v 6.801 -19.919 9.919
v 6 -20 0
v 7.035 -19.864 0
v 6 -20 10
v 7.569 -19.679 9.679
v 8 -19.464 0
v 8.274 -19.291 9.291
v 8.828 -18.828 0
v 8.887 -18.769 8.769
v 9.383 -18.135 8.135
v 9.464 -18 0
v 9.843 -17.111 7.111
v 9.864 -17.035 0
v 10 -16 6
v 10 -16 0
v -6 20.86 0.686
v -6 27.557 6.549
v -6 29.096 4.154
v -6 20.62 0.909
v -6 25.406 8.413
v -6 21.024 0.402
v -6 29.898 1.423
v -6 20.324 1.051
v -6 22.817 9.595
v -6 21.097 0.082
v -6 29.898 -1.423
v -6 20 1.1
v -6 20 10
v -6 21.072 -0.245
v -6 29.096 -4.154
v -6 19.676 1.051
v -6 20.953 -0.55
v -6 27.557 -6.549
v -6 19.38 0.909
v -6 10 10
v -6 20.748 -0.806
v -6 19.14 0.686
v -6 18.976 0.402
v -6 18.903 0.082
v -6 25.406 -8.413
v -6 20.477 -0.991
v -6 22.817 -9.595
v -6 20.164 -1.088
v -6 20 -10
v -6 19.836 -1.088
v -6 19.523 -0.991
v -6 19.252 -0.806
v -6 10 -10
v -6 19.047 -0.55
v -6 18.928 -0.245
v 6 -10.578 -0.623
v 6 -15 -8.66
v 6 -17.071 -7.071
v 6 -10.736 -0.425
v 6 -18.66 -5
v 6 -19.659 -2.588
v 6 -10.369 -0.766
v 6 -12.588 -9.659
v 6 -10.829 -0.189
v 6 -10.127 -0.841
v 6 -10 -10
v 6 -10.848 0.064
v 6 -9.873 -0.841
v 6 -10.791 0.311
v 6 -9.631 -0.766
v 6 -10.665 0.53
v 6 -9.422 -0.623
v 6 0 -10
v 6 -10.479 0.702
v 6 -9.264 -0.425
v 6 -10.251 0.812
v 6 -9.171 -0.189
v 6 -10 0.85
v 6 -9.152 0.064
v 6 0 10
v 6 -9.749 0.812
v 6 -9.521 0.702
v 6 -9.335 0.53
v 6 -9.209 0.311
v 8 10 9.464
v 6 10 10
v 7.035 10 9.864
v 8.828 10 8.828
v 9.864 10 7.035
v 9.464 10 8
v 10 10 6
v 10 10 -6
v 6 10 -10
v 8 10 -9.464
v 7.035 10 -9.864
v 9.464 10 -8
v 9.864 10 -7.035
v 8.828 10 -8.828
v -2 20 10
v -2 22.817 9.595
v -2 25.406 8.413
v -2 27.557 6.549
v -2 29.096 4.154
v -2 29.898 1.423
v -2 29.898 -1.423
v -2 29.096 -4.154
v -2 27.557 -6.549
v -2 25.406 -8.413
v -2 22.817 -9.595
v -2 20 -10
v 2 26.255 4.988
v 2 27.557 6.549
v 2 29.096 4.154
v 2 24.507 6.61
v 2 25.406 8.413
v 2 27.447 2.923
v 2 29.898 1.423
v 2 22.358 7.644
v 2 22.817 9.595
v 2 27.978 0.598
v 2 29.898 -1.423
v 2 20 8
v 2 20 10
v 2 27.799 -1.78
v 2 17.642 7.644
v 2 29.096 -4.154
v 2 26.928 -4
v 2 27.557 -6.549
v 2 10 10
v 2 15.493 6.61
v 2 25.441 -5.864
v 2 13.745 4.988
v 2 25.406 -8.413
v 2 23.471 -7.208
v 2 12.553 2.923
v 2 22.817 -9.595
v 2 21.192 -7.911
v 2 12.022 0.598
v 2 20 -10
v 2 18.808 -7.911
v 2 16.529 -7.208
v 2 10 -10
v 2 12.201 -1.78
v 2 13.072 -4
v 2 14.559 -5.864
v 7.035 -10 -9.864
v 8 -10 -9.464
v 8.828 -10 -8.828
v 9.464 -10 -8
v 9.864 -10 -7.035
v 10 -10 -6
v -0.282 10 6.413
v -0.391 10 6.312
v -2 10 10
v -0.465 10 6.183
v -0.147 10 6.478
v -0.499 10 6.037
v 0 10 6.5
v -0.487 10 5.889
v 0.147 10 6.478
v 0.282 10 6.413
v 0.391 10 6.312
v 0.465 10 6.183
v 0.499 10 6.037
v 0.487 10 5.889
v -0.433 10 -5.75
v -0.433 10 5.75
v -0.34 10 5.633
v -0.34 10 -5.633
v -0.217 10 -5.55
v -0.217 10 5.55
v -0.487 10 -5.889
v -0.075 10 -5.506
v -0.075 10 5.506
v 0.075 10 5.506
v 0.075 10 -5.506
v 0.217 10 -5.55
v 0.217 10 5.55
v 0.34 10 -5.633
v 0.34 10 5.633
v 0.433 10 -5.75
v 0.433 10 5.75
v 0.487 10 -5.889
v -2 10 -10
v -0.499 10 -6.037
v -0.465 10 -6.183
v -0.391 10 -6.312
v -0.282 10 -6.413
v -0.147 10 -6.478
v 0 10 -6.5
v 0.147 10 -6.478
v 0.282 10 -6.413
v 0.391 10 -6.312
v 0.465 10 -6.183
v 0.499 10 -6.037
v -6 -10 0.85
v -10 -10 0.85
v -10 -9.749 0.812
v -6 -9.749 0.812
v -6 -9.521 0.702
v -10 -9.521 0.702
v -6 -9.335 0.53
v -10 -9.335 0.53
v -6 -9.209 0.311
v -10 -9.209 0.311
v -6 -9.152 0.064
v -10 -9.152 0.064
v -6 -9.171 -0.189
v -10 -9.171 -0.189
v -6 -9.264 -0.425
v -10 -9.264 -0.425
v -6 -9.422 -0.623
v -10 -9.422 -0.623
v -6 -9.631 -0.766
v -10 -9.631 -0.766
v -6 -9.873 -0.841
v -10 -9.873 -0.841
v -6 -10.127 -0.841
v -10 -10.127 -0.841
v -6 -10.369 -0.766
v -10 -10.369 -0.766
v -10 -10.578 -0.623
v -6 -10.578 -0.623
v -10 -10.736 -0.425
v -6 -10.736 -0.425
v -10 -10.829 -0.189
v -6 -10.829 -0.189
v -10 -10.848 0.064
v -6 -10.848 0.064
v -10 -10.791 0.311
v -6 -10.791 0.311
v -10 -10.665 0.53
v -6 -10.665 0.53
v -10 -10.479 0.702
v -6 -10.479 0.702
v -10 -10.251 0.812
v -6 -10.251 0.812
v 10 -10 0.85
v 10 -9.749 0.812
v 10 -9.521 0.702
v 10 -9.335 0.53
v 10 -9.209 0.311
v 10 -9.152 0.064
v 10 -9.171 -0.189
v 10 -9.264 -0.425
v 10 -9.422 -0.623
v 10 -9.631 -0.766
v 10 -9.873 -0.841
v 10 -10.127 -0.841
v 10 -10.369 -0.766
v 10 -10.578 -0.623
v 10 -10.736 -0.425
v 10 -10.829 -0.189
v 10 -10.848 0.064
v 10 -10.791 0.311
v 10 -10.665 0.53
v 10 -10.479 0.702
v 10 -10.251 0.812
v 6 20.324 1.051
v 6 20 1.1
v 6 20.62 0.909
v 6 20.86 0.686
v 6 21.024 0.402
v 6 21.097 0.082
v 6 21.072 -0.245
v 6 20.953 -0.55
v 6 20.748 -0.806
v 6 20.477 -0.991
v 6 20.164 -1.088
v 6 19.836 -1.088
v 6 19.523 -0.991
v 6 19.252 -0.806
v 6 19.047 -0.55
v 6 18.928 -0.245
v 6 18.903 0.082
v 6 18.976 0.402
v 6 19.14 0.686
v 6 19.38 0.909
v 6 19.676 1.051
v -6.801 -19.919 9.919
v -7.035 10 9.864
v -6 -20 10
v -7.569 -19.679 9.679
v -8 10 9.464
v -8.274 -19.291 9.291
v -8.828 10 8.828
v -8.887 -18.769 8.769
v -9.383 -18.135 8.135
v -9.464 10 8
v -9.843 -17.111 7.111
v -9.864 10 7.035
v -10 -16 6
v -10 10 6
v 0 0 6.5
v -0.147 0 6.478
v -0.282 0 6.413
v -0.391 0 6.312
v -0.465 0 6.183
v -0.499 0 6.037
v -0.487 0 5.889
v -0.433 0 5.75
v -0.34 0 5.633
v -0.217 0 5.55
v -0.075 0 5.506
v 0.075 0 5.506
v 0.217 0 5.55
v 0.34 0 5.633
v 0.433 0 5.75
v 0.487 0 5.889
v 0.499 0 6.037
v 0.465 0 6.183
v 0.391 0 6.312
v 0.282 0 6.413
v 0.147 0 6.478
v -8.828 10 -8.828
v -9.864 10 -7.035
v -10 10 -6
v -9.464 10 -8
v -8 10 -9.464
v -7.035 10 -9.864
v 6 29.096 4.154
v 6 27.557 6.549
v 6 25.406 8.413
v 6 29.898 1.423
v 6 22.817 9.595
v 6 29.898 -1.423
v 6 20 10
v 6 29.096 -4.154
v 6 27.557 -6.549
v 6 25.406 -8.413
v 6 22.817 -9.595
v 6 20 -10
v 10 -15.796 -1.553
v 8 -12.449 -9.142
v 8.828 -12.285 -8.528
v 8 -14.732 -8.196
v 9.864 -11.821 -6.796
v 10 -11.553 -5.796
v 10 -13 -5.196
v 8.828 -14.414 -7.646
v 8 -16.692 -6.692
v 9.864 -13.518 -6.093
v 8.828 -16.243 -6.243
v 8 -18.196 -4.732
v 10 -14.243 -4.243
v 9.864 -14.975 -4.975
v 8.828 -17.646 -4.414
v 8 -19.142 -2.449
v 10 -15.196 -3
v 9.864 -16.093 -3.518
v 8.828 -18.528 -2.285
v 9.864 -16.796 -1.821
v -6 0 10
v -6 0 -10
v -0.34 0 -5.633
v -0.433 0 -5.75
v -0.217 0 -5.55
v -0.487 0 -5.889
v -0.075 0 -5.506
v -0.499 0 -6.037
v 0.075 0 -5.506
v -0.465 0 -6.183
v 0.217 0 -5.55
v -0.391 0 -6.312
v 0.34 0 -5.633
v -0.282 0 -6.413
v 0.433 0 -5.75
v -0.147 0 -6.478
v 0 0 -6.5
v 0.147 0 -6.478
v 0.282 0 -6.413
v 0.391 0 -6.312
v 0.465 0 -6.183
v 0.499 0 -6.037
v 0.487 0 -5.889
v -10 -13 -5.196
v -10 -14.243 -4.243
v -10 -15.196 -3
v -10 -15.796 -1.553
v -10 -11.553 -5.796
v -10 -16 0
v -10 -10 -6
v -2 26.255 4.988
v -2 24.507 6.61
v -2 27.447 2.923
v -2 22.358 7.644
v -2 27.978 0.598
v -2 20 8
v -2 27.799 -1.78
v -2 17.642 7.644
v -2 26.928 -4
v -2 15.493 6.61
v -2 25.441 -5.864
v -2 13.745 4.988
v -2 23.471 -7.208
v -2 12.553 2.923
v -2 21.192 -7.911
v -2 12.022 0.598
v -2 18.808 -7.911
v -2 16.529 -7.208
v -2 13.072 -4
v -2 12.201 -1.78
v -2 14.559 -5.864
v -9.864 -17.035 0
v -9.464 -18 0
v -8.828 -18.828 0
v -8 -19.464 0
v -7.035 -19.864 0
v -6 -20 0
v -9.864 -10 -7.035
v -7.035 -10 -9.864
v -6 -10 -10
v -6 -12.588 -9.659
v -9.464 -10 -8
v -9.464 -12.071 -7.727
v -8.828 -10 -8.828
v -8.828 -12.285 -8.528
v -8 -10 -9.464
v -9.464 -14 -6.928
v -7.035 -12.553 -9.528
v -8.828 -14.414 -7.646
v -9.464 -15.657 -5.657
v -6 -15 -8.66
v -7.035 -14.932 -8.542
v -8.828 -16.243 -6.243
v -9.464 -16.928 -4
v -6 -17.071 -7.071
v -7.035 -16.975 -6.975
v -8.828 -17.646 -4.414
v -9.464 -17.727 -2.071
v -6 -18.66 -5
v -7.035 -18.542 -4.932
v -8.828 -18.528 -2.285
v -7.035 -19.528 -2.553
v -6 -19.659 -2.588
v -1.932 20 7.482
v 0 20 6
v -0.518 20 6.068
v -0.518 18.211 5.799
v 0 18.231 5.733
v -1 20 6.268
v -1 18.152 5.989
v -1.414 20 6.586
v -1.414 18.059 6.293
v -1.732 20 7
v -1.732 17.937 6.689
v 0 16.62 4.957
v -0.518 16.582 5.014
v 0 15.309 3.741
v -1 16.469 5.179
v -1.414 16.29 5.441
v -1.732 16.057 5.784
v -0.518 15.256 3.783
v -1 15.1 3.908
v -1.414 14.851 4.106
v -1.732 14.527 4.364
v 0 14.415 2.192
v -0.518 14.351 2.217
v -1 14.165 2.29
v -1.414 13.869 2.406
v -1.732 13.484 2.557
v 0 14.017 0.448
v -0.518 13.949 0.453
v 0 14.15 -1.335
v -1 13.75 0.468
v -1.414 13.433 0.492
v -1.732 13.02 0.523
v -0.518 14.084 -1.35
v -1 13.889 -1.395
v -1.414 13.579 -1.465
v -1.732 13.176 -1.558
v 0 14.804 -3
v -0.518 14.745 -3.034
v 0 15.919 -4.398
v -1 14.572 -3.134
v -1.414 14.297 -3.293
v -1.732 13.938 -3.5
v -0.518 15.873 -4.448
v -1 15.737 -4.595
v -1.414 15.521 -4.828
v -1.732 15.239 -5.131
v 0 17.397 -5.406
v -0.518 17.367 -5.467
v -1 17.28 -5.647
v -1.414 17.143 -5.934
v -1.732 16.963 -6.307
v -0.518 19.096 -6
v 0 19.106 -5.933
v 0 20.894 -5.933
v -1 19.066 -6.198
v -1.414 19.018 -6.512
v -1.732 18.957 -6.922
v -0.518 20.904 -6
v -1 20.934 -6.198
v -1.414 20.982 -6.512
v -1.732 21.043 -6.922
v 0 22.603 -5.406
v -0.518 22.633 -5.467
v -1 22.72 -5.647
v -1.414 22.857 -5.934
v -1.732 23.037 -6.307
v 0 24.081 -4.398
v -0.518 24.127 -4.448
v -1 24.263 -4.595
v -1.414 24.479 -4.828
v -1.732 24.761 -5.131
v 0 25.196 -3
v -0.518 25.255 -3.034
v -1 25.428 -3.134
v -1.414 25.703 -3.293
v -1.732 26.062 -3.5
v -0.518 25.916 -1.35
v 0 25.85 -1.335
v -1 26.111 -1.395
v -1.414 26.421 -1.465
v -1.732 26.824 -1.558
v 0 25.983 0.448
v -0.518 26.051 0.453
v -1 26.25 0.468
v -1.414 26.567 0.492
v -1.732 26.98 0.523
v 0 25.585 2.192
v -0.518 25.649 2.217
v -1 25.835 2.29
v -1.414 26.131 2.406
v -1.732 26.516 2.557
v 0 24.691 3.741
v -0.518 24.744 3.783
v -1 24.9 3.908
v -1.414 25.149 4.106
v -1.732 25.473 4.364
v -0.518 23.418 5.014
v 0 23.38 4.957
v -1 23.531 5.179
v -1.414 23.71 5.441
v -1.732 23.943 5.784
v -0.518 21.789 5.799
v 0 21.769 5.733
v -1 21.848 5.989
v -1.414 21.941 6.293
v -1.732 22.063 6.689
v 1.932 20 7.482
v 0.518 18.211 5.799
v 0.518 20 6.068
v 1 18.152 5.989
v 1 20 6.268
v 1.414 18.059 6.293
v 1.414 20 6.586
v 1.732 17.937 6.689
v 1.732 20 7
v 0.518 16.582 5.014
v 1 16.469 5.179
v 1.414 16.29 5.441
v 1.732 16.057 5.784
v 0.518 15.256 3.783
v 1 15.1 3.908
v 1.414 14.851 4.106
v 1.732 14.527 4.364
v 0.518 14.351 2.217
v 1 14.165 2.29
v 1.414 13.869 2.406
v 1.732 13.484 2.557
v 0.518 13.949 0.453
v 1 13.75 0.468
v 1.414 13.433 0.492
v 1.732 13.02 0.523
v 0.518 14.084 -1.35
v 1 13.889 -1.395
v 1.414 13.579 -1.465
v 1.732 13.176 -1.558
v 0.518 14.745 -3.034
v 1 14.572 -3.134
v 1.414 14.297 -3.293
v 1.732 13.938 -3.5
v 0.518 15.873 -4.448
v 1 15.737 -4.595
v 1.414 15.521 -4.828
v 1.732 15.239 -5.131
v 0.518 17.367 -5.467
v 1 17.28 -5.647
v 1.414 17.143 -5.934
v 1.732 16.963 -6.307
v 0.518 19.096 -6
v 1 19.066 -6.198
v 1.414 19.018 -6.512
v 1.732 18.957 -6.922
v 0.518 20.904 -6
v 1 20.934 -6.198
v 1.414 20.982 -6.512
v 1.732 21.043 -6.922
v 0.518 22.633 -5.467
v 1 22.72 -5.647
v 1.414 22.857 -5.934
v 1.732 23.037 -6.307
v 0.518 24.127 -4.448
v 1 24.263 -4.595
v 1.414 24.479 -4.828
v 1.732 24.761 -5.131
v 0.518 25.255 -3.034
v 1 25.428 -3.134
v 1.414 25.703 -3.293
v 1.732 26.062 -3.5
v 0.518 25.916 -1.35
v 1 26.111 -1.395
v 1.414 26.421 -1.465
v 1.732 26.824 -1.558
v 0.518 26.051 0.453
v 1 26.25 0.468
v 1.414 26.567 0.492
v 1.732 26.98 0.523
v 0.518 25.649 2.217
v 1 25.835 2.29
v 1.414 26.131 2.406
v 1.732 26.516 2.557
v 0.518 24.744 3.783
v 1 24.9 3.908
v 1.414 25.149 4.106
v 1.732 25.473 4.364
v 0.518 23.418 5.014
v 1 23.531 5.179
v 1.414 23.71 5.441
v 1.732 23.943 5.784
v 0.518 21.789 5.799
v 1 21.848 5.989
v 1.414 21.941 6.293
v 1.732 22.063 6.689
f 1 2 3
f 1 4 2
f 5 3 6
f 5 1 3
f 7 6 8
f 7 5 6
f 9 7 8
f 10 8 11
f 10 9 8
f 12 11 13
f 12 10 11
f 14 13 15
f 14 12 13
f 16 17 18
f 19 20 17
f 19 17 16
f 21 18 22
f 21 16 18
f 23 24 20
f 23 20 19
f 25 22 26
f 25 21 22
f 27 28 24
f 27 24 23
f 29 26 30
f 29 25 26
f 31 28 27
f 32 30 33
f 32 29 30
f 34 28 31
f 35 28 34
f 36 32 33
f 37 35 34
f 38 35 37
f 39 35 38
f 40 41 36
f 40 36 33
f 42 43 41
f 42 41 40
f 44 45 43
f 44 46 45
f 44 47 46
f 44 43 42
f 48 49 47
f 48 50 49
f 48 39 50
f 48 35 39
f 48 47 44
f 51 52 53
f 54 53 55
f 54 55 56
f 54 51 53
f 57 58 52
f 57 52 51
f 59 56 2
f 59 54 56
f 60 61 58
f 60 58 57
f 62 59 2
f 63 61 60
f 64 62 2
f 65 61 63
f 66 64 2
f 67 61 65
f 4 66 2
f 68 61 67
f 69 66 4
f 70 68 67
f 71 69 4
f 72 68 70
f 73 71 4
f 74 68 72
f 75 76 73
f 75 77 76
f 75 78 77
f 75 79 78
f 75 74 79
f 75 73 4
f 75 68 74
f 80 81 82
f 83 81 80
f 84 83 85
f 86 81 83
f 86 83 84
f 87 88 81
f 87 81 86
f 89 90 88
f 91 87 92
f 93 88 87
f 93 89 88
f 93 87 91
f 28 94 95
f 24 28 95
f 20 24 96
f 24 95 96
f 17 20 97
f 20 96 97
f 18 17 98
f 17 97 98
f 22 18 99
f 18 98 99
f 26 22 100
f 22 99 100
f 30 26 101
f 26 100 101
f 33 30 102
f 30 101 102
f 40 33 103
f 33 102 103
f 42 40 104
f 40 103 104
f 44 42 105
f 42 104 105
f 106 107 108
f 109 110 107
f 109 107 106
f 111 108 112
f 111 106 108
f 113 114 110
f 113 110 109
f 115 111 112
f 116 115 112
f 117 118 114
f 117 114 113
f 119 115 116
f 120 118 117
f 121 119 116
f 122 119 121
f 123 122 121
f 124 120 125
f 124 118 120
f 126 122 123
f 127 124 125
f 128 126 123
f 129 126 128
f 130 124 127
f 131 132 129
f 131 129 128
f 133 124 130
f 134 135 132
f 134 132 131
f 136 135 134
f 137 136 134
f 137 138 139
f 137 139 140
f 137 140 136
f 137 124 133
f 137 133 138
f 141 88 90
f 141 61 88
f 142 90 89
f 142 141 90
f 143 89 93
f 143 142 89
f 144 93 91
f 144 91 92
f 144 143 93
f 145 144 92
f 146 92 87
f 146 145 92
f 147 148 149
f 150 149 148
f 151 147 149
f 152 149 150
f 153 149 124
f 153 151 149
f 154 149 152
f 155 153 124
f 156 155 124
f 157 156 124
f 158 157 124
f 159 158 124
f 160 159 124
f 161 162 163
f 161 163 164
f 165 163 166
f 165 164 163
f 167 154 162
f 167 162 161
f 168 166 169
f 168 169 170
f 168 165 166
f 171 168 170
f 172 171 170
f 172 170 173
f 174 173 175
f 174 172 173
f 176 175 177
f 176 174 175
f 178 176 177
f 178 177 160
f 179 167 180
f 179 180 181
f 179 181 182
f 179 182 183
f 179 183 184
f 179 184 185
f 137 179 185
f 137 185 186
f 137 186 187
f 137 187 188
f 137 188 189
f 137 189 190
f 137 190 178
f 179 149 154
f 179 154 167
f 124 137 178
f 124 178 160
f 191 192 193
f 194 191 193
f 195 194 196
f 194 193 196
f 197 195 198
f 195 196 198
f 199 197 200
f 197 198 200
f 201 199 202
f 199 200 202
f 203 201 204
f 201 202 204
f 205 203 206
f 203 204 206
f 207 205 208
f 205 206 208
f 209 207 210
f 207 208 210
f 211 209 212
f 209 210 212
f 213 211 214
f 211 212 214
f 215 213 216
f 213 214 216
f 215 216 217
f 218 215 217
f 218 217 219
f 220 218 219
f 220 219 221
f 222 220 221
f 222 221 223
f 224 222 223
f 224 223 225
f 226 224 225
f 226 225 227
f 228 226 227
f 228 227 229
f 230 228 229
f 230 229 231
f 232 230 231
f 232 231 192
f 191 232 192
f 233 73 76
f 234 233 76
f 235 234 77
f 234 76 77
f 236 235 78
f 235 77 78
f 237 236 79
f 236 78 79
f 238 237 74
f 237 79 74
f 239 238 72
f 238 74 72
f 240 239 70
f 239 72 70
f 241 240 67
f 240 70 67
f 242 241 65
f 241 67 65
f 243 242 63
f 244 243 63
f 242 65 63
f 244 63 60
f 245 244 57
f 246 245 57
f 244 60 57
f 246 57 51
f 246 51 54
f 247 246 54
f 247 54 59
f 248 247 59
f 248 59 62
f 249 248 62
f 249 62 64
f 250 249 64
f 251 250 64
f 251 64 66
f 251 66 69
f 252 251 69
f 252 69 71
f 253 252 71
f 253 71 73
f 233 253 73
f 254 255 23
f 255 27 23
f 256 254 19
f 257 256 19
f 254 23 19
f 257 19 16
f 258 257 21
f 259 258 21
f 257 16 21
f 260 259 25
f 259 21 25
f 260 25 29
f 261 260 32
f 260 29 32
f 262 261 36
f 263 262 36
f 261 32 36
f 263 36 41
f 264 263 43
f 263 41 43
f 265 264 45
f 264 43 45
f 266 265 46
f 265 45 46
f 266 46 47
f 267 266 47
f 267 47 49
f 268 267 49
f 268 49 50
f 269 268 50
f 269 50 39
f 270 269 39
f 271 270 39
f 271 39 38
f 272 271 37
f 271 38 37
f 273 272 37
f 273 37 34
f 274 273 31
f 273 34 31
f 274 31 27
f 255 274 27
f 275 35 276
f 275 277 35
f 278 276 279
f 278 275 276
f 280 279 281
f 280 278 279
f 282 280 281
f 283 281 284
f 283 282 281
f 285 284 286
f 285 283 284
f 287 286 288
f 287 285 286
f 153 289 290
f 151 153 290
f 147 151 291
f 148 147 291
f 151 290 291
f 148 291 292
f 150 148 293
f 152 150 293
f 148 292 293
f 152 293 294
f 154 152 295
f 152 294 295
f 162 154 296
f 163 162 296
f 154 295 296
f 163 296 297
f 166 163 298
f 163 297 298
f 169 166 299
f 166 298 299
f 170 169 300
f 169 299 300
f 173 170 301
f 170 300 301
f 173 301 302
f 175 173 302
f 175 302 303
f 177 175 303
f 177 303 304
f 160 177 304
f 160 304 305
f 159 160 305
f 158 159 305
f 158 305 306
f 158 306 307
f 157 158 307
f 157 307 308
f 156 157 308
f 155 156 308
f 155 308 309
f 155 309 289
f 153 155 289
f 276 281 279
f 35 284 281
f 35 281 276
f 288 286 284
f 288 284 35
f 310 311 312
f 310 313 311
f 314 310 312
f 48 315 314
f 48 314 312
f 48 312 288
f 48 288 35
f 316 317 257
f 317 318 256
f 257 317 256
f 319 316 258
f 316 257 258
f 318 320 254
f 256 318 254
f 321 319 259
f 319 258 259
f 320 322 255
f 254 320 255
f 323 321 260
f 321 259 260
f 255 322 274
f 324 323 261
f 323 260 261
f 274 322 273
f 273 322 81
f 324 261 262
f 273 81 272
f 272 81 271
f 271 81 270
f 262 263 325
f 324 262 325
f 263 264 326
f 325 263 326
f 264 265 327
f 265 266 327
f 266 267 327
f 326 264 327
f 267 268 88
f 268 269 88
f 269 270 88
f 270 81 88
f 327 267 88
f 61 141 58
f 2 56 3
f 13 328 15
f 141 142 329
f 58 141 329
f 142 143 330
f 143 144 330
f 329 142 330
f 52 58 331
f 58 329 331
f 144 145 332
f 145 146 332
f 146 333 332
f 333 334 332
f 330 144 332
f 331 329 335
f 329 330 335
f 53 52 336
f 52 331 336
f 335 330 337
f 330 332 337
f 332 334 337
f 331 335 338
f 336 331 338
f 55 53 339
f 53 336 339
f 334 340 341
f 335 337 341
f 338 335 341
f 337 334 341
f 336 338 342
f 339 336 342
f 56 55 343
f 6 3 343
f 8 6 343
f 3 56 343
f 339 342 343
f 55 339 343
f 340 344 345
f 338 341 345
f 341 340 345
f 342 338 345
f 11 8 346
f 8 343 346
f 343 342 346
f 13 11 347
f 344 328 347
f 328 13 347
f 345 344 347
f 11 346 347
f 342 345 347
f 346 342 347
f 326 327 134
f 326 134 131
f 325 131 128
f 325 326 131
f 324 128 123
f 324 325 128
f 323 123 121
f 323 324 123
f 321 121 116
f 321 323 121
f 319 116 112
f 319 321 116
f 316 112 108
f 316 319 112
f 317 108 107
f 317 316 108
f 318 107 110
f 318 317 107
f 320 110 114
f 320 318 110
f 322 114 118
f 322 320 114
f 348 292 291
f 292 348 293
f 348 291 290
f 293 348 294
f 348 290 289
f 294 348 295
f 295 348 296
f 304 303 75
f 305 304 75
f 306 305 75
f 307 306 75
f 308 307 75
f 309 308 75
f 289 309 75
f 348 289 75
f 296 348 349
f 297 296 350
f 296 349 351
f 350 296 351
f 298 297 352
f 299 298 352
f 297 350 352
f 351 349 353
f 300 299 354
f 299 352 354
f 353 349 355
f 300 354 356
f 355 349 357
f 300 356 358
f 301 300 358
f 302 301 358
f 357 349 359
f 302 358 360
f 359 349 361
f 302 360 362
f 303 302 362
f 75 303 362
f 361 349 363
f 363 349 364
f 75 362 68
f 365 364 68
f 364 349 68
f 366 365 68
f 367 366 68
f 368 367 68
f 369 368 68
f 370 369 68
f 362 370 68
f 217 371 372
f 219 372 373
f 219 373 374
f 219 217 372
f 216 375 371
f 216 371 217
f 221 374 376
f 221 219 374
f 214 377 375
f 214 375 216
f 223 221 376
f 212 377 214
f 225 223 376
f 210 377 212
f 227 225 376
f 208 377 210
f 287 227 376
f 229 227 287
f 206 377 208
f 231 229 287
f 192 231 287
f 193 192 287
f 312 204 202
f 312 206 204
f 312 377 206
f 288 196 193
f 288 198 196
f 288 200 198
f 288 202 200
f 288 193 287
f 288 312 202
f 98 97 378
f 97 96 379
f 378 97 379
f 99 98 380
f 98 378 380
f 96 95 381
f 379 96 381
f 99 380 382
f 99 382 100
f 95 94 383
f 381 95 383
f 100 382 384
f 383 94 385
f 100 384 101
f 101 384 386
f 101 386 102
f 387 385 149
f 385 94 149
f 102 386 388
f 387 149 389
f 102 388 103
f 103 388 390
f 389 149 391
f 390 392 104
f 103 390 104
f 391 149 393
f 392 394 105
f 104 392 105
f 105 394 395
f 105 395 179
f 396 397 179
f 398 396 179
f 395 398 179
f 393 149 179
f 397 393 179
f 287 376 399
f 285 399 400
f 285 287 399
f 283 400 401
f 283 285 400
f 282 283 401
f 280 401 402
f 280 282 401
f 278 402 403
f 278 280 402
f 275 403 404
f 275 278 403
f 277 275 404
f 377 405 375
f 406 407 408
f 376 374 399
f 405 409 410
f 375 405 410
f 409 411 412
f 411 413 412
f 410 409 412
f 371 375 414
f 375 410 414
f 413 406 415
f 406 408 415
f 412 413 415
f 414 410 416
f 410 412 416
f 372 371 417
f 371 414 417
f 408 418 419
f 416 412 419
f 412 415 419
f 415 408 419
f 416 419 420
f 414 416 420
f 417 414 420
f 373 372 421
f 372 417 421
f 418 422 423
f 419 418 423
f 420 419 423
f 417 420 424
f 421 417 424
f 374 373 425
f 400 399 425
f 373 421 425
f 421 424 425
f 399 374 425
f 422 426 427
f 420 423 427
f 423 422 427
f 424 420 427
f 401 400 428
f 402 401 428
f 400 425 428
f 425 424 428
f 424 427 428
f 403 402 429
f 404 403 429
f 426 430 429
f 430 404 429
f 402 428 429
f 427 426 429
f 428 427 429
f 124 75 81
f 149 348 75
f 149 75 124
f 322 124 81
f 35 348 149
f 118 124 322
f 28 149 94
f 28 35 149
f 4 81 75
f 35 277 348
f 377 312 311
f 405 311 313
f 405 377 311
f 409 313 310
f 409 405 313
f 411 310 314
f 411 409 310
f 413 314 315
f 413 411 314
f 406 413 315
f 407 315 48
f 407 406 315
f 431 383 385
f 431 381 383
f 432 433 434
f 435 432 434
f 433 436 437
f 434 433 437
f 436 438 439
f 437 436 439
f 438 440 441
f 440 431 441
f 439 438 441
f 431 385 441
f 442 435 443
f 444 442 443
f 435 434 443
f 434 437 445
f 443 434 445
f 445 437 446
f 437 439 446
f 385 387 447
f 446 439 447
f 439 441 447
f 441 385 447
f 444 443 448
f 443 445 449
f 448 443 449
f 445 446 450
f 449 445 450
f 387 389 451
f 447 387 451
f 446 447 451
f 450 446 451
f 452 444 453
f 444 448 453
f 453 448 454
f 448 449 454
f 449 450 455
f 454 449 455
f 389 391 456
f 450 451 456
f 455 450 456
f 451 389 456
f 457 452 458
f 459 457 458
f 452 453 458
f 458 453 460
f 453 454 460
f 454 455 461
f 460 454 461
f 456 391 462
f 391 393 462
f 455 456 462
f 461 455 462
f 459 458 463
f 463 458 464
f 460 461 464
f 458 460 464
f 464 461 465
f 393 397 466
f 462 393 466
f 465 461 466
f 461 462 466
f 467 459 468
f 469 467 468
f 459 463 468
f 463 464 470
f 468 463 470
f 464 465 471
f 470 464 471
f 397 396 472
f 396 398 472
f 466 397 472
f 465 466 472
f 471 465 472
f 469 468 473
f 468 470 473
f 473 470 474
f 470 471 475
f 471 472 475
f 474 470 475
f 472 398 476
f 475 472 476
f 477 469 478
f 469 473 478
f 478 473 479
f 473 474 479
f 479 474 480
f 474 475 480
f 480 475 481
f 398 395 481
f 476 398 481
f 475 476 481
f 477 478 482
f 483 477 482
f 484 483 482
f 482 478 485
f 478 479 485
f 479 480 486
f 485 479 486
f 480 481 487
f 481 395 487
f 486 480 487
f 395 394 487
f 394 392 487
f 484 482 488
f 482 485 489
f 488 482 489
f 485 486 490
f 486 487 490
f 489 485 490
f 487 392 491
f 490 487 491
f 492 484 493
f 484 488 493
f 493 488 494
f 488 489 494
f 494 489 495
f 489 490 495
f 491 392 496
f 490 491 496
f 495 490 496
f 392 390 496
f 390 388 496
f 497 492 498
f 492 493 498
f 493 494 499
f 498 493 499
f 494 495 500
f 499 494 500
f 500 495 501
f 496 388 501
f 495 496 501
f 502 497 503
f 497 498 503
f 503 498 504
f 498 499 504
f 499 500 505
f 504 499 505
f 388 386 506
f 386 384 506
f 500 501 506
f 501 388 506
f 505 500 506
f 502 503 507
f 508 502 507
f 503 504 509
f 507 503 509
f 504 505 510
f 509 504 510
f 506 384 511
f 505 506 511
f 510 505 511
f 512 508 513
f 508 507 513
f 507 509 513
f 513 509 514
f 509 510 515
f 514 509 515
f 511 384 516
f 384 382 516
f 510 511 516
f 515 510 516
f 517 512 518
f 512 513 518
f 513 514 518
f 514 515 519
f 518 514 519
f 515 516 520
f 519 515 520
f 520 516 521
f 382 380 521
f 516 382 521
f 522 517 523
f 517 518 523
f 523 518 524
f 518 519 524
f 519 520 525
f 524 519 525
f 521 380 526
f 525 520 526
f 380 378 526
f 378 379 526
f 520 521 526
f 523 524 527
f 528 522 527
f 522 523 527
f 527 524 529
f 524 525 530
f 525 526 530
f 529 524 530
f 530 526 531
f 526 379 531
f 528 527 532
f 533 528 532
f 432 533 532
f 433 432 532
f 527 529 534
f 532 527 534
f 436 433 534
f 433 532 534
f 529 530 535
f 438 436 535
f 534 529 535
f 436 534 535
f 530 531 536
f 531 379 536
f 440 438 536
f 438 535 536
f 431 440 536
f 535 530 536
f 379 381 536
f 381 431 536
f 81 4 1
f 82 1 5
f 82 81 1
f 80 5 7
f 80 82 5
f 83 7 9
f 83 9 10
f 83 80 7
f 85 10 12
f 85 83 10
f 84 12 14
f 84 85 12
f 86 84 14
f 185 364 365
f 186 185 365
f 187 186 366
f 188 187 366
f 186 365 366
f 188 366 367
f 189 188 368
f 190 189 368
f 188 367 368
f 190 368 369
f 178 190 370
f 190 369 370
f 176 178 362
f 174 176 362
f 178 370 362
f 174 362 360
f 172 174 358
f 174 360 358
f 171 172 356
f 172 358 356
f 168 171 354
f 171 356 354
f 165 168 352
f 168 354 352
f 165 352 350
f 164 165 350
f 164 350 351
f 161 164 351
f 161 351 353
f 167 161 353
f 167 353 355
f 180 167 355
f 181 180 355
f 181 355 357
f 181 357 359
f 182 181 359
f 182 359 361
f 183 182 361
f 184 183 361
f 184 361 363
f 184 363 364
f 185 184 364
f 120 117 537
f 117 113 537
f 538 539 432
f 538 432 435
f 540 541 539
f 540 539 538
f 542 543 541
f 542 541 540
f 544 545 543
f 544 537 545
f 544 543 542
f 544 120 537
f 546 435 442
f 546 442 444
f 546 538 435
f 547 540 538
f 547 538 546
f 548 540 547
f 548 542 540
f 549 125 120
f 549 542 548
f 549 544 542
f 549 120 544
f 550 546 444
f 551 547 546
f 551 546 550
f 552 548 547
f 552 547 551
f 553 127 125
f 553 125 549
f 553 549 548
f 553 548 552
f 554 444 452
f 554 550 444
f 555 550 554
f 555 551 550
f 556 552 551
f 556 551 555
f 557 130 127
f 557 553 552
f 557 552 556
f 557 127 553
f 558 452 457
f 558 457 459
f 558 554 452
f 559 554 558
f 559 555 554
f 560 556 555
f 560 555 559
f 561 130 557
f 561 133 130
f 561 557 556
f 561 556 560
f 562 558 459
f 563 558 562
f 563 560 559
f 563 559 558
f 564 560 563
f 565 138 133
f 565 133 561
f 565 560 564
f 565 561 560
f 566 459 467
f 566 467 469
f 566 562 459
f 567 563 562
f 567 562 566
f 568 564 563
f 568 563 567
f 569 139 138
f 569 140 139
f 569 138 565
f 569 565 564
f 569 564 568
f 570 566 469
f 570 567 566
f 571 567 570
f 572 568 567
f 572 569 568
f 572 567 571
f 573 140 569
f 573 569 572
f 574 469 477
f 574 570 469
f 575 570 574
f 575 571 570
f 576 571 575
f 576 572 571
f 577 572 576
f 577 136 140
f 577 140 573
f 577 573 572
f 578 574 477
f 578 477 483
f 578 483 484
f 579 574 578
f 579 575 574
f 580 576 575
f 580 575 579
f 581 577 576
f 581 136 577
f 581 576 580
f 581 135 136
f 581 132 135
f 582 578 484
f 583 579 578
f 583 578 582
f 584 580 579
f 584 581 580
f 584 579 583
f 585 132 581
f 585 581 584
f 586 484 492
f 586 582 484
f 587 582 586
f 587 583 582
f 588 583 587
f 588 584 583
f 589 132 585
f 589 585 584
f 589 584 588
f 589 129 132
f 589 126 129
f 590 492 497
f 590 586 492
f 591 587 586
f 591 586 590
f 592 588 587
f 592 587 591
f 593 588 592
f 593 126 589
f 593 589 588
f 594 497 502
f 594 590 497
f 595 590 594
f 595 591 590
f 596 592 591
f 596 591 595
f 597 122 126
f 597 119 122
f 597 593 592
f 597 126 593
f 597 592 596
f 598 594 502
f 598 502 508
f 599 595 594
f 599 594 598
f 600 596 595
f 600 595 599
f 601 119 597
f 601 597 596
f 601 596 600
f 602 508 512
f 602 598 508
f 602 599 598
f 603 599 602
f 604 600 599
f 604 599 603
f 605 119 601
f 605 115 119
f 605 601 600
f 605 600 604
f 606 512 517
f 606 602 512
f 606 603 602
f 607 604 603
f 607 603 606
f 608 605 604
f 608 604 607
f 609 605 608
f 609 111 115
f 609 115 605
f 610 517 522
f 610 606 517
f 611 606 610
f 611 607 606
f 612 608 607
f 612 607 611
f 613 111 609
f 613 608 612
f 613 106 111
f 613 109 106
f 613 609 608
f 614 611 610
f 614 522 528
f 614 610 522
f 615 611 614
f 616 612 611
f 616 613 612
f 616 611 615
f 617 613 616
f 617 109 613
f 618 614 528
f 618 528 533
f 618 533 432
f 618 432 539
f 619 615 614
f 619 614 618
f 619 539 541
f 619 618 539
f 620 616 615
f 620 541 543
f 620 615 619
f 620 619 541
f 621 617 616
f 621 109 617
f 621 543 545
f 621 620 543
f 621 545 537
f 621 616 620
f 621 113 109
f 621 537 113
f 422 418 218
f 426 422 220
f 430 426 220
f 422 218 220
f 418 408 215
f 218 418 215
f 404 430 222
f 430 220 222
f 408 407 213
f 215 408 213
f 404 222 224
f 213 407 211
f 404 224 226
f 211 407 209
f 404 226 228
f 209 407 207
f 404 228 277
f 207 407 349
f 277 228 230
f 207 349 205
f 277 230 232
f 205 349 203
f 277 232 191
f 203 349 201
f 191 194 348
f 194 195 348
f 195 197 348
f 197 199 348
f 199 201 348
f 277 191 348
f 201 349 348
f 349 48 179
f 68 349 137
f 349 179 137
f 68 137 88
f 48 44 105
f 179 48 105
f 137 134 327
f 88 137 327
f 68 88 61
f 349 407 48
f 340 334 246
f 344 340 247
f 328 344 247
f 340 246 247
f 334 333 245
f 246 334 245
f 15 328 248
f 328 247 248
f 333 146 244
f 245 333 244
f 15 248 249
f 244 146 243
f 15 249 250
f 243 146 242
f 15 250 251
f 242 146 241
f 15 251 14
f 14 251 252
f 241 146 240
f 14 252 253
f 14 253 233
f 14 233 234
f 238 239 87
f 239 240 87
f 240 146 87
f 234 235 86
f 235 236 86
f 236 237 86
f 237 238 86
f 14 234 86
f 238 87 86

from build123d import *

# Parameters (mm, degrees)
SKETCH1_W           = 20
SKETCH1_H           = 20
BOSS_EXTRUDE1_DEPTH = 10
SKETCH4_W           = 4
SKETCH4_H           = 20
BOSS_EXTRUDE2_DEPTH = 10
BOSS_EXTRUDE3_DEPTH = 4
BOSS_EXTRUDE4_START = -4
BOSS_EXTRUDE4_DEPTH = 4
SKETCH7_R           = 0.85
CUT_EXTRUDE1_DEPTH  = 31
FILLET1_R           = 4
SKETCH8_W           = 4
SKETCH8_H           = 20
BOSS_EXTRUDE5_DEPTH = 10
SKETCH9_R           = 10
BOSS_EXTRUDE6_DEPTH = 4
BOSS_EXTRUDE7_START = -4
SKETCH10_R          = 10
BOSS_EXTRUDE7_DEPTH = 4
SKETCH12_R          = 1.1
CUT_EXTRUDE2_DEPTH  = 36.440090293
SKETCH13_R          = 6
BOSS_EXTRUDE8_DEPTH = 4
SKETCH14_R          = 1.1
CUT_EXTRUDE3_DEPTH  = 4
FILLET2_R           = 2
CUT_EXTRUDE4_REACH  = 35.166
SKETCH16_R          = 0.5


with BuildPart() as part:
    # Sketch1 → Boss-Extrude1 (new body)
    with BuildSketch(Plane(origin=(0, 0, 0), x_dir=(1, 0, 0), z_dir=(0, 1, 0))):
        Rectangle(SKETCH1_W, SKETCH1_H)
    extrude(amount=BOSS_EXTRUDE1_DEPTH)

    # Sketch4 → Boss-Extrude2 (add)
    with BuildSketch(Plane.XZ):
        with Locations((-8, 0)):
            Rectangle(SKETCH4_W, SKETCH4_H)
        with Locations((8, 0)):
            Rectangle(SKETCH4_W, SKETCH4_H)
    extrude(amount=BOSS_EXTRUDE2_DEPTH)

    # Sketch5 → Boss-Extrude3 (add)
    with BuildSketch(Plane.ZY.offset(10)):
        with BuildLine():
            Line((0, -20), (10, -20))
            Line((10, -20), (10, -10))
            ThreePointArc((10, -10), (-7.071067812, -2.928932188), (0, -20))
        make_face()
    extrude(amount=-BOSS_EXTRUDE3_DEPTH)

    # Sketch6 → Boss-Extrude4 (add)
    with BuildSketch(Plane(origin=(10, 0, 0), x_dir=(0, 0, -1), z_dir=(1, 0, 0)).offset(BOSS_EXTRUDE4_START)):
        with BuildLine():
            Line((0, -20), (-10, -20))
            Line((-10, -20), (-10, -10))
            ThreePointArc((-10, -10), (7.071067812, -2.928932188), (0, -20))
        make_face()
    extrude(amount=BOSS_EXTRUDE4_DEPTH)

    # Sketch7 → Cut-Extrude1 (cut, through all)
    with BuildSketch(Plane.ZY.offset(10)):
        with Locations((0, -10)):
            Circle(SKETCH7_R)
    extrude(amount=-CUT_EXTRUDE1_DEPTH, mode=Mode.SUBTRACT)

    # Fillet1
    fillet1_edges = [part.edges().sort_by_distance(p)[0] for p in [
        (-10, -5, 10),
        (-10, -17.071067812, -7.071067812),
        (10, -5, 10),
        (10, -17.071067812, -7.071067812),
        (-10, 0, -10),
        (10, 0, -10),
        (10, -20, 5),
        (-10, -20, 5),
    ]]
    fillet(fillet1_edges, radius=FILLET1_R - 0.0001)  # a hair under: the kernel refuses the full size

    # Sketch8 → Boss-Extrude5 (add)
    with BuildSketch(Plane(origin=(0, 10, 0), x_dir=(1, 0, 0), z_dir=(0, 1, 0))):
        with Locations((4, 0)):
            Rectangle(SKETCH8_W, SKETCH8_H)
        with Locations((-4, 0)):
            Rectangle(SKETCH8_W, SKETCH8_H)
    extrude(amount=BOSS_EXTRUDE5_DEPTH)

    # Sketch9 → Boss-Extrude6 (add)
    with BuildSketch(Plane(origin=(6, 0, 0), x_dir=(0, 0, -1), z_dir=(1, 0, 0))):
        with Locations((0, 20)):
            Circle(SKETCH9_R)
    extrude(amount=-BOSS_EXTRUDE6_DEPTH)

    # Sketch10 → Boss-Extrude7 (add)
    with BuildSketch(Plane.ZY.offset(6).offset(BOSS_EXTRUDE7_START)):
        with Locations((0, 20)):
            Circle(SKETCH10_R)
    extrude(amount=BOSS_EXTRUDE7_DEPTH)

    # Sketch12 → Cut-Extrude2 (cut, through all)
    with BuildSketch(Plane.ZY.offset(6)):
        with Locations((0, 20)):
            Circle(SKETCH12_R)
    extrude(amount=-CUT_EXTRUDE2_DEPTH, mode=Mode.SUBTRACT)

    # Sketch13 → Boss-Extrude8 (add)
    with BuildSketch(Plane(origin=(-2, 0, 0), x_dir=(0, 0, -1), z_dir=(1, 0, 0))):
        with Locations(Location((0, 20, 0), (0, 0, 180))):
            Circle(SKETCH13_R)
    extrude(amount=BOSS_EXTRUDE8_DEPTH)

    # Sketch14 → Cut-Extrude3 (cut)
    with BuildSketch(Plane(origin=(-2, 0, 0), x_dir=(0, 0, -1), z_dir=(1, 0, 0))):
        with Locations(Location((0, 20, 0), (0, 0, 180))):
            Circle(SKETCH14_R)
    extrude(amount=CUT_EXTRUDE3_DEPTH, mode=Mode.SUBTRACT)

    # Fillet2
    fillet2_edges = [part.edges().sort_by_distance(p)[0] for p in [
        (-2, 20, -6),
        (2, 20, -6),
    ]]
    fillet(fillet2_edges, radius=FILLET2_R - 0.0001)  # a hair under: the kernel refuses the full size

    # Sketch16 → Cut-Extrude4 (cut, up to next)
    with BuildSketch(Plane.XZ, mode=Mode.PRIVATE) as cut_extrude4_sk1:
        with Locations(Location((0, -6, 0), (0, 0, 270))):
            Circle(SKETCH16_R)
    cut_extrude4_tool1 = extrude(cut_extrude4_sk1.sketch, amount=-CUT_EXTRUDE4_REACH, mode=Mode.PRIVATE) & part.part
    # Sketch16 → Cut-Extrude4 (cut, up to next)
    with BuildSketch(Plane.XZ, mode=Mode.PRIVATE) as cut_extrude4_sk2:
        with Locations(Location((0, 6, 0), (0, 0, 90))):
            Circle(SKETCH16_R)
    cut_extrude4_tool2 = extrude(cut_extrude4_sk2.sketch, amount=-CUT_EXTRUDE4_REACH, mode=Mode.PRIVATE) & part.part
    add(cut_extrude4_tool1.solids().sort_by_distance((0, 0, -6))[0], mode=Mode.SUBTRACT)
    add(cut_extrude4_tool2.solids().sort_by_distance((0, 0, 6))[0], mode=Mode.SUBTRACT)


solid = part.part
